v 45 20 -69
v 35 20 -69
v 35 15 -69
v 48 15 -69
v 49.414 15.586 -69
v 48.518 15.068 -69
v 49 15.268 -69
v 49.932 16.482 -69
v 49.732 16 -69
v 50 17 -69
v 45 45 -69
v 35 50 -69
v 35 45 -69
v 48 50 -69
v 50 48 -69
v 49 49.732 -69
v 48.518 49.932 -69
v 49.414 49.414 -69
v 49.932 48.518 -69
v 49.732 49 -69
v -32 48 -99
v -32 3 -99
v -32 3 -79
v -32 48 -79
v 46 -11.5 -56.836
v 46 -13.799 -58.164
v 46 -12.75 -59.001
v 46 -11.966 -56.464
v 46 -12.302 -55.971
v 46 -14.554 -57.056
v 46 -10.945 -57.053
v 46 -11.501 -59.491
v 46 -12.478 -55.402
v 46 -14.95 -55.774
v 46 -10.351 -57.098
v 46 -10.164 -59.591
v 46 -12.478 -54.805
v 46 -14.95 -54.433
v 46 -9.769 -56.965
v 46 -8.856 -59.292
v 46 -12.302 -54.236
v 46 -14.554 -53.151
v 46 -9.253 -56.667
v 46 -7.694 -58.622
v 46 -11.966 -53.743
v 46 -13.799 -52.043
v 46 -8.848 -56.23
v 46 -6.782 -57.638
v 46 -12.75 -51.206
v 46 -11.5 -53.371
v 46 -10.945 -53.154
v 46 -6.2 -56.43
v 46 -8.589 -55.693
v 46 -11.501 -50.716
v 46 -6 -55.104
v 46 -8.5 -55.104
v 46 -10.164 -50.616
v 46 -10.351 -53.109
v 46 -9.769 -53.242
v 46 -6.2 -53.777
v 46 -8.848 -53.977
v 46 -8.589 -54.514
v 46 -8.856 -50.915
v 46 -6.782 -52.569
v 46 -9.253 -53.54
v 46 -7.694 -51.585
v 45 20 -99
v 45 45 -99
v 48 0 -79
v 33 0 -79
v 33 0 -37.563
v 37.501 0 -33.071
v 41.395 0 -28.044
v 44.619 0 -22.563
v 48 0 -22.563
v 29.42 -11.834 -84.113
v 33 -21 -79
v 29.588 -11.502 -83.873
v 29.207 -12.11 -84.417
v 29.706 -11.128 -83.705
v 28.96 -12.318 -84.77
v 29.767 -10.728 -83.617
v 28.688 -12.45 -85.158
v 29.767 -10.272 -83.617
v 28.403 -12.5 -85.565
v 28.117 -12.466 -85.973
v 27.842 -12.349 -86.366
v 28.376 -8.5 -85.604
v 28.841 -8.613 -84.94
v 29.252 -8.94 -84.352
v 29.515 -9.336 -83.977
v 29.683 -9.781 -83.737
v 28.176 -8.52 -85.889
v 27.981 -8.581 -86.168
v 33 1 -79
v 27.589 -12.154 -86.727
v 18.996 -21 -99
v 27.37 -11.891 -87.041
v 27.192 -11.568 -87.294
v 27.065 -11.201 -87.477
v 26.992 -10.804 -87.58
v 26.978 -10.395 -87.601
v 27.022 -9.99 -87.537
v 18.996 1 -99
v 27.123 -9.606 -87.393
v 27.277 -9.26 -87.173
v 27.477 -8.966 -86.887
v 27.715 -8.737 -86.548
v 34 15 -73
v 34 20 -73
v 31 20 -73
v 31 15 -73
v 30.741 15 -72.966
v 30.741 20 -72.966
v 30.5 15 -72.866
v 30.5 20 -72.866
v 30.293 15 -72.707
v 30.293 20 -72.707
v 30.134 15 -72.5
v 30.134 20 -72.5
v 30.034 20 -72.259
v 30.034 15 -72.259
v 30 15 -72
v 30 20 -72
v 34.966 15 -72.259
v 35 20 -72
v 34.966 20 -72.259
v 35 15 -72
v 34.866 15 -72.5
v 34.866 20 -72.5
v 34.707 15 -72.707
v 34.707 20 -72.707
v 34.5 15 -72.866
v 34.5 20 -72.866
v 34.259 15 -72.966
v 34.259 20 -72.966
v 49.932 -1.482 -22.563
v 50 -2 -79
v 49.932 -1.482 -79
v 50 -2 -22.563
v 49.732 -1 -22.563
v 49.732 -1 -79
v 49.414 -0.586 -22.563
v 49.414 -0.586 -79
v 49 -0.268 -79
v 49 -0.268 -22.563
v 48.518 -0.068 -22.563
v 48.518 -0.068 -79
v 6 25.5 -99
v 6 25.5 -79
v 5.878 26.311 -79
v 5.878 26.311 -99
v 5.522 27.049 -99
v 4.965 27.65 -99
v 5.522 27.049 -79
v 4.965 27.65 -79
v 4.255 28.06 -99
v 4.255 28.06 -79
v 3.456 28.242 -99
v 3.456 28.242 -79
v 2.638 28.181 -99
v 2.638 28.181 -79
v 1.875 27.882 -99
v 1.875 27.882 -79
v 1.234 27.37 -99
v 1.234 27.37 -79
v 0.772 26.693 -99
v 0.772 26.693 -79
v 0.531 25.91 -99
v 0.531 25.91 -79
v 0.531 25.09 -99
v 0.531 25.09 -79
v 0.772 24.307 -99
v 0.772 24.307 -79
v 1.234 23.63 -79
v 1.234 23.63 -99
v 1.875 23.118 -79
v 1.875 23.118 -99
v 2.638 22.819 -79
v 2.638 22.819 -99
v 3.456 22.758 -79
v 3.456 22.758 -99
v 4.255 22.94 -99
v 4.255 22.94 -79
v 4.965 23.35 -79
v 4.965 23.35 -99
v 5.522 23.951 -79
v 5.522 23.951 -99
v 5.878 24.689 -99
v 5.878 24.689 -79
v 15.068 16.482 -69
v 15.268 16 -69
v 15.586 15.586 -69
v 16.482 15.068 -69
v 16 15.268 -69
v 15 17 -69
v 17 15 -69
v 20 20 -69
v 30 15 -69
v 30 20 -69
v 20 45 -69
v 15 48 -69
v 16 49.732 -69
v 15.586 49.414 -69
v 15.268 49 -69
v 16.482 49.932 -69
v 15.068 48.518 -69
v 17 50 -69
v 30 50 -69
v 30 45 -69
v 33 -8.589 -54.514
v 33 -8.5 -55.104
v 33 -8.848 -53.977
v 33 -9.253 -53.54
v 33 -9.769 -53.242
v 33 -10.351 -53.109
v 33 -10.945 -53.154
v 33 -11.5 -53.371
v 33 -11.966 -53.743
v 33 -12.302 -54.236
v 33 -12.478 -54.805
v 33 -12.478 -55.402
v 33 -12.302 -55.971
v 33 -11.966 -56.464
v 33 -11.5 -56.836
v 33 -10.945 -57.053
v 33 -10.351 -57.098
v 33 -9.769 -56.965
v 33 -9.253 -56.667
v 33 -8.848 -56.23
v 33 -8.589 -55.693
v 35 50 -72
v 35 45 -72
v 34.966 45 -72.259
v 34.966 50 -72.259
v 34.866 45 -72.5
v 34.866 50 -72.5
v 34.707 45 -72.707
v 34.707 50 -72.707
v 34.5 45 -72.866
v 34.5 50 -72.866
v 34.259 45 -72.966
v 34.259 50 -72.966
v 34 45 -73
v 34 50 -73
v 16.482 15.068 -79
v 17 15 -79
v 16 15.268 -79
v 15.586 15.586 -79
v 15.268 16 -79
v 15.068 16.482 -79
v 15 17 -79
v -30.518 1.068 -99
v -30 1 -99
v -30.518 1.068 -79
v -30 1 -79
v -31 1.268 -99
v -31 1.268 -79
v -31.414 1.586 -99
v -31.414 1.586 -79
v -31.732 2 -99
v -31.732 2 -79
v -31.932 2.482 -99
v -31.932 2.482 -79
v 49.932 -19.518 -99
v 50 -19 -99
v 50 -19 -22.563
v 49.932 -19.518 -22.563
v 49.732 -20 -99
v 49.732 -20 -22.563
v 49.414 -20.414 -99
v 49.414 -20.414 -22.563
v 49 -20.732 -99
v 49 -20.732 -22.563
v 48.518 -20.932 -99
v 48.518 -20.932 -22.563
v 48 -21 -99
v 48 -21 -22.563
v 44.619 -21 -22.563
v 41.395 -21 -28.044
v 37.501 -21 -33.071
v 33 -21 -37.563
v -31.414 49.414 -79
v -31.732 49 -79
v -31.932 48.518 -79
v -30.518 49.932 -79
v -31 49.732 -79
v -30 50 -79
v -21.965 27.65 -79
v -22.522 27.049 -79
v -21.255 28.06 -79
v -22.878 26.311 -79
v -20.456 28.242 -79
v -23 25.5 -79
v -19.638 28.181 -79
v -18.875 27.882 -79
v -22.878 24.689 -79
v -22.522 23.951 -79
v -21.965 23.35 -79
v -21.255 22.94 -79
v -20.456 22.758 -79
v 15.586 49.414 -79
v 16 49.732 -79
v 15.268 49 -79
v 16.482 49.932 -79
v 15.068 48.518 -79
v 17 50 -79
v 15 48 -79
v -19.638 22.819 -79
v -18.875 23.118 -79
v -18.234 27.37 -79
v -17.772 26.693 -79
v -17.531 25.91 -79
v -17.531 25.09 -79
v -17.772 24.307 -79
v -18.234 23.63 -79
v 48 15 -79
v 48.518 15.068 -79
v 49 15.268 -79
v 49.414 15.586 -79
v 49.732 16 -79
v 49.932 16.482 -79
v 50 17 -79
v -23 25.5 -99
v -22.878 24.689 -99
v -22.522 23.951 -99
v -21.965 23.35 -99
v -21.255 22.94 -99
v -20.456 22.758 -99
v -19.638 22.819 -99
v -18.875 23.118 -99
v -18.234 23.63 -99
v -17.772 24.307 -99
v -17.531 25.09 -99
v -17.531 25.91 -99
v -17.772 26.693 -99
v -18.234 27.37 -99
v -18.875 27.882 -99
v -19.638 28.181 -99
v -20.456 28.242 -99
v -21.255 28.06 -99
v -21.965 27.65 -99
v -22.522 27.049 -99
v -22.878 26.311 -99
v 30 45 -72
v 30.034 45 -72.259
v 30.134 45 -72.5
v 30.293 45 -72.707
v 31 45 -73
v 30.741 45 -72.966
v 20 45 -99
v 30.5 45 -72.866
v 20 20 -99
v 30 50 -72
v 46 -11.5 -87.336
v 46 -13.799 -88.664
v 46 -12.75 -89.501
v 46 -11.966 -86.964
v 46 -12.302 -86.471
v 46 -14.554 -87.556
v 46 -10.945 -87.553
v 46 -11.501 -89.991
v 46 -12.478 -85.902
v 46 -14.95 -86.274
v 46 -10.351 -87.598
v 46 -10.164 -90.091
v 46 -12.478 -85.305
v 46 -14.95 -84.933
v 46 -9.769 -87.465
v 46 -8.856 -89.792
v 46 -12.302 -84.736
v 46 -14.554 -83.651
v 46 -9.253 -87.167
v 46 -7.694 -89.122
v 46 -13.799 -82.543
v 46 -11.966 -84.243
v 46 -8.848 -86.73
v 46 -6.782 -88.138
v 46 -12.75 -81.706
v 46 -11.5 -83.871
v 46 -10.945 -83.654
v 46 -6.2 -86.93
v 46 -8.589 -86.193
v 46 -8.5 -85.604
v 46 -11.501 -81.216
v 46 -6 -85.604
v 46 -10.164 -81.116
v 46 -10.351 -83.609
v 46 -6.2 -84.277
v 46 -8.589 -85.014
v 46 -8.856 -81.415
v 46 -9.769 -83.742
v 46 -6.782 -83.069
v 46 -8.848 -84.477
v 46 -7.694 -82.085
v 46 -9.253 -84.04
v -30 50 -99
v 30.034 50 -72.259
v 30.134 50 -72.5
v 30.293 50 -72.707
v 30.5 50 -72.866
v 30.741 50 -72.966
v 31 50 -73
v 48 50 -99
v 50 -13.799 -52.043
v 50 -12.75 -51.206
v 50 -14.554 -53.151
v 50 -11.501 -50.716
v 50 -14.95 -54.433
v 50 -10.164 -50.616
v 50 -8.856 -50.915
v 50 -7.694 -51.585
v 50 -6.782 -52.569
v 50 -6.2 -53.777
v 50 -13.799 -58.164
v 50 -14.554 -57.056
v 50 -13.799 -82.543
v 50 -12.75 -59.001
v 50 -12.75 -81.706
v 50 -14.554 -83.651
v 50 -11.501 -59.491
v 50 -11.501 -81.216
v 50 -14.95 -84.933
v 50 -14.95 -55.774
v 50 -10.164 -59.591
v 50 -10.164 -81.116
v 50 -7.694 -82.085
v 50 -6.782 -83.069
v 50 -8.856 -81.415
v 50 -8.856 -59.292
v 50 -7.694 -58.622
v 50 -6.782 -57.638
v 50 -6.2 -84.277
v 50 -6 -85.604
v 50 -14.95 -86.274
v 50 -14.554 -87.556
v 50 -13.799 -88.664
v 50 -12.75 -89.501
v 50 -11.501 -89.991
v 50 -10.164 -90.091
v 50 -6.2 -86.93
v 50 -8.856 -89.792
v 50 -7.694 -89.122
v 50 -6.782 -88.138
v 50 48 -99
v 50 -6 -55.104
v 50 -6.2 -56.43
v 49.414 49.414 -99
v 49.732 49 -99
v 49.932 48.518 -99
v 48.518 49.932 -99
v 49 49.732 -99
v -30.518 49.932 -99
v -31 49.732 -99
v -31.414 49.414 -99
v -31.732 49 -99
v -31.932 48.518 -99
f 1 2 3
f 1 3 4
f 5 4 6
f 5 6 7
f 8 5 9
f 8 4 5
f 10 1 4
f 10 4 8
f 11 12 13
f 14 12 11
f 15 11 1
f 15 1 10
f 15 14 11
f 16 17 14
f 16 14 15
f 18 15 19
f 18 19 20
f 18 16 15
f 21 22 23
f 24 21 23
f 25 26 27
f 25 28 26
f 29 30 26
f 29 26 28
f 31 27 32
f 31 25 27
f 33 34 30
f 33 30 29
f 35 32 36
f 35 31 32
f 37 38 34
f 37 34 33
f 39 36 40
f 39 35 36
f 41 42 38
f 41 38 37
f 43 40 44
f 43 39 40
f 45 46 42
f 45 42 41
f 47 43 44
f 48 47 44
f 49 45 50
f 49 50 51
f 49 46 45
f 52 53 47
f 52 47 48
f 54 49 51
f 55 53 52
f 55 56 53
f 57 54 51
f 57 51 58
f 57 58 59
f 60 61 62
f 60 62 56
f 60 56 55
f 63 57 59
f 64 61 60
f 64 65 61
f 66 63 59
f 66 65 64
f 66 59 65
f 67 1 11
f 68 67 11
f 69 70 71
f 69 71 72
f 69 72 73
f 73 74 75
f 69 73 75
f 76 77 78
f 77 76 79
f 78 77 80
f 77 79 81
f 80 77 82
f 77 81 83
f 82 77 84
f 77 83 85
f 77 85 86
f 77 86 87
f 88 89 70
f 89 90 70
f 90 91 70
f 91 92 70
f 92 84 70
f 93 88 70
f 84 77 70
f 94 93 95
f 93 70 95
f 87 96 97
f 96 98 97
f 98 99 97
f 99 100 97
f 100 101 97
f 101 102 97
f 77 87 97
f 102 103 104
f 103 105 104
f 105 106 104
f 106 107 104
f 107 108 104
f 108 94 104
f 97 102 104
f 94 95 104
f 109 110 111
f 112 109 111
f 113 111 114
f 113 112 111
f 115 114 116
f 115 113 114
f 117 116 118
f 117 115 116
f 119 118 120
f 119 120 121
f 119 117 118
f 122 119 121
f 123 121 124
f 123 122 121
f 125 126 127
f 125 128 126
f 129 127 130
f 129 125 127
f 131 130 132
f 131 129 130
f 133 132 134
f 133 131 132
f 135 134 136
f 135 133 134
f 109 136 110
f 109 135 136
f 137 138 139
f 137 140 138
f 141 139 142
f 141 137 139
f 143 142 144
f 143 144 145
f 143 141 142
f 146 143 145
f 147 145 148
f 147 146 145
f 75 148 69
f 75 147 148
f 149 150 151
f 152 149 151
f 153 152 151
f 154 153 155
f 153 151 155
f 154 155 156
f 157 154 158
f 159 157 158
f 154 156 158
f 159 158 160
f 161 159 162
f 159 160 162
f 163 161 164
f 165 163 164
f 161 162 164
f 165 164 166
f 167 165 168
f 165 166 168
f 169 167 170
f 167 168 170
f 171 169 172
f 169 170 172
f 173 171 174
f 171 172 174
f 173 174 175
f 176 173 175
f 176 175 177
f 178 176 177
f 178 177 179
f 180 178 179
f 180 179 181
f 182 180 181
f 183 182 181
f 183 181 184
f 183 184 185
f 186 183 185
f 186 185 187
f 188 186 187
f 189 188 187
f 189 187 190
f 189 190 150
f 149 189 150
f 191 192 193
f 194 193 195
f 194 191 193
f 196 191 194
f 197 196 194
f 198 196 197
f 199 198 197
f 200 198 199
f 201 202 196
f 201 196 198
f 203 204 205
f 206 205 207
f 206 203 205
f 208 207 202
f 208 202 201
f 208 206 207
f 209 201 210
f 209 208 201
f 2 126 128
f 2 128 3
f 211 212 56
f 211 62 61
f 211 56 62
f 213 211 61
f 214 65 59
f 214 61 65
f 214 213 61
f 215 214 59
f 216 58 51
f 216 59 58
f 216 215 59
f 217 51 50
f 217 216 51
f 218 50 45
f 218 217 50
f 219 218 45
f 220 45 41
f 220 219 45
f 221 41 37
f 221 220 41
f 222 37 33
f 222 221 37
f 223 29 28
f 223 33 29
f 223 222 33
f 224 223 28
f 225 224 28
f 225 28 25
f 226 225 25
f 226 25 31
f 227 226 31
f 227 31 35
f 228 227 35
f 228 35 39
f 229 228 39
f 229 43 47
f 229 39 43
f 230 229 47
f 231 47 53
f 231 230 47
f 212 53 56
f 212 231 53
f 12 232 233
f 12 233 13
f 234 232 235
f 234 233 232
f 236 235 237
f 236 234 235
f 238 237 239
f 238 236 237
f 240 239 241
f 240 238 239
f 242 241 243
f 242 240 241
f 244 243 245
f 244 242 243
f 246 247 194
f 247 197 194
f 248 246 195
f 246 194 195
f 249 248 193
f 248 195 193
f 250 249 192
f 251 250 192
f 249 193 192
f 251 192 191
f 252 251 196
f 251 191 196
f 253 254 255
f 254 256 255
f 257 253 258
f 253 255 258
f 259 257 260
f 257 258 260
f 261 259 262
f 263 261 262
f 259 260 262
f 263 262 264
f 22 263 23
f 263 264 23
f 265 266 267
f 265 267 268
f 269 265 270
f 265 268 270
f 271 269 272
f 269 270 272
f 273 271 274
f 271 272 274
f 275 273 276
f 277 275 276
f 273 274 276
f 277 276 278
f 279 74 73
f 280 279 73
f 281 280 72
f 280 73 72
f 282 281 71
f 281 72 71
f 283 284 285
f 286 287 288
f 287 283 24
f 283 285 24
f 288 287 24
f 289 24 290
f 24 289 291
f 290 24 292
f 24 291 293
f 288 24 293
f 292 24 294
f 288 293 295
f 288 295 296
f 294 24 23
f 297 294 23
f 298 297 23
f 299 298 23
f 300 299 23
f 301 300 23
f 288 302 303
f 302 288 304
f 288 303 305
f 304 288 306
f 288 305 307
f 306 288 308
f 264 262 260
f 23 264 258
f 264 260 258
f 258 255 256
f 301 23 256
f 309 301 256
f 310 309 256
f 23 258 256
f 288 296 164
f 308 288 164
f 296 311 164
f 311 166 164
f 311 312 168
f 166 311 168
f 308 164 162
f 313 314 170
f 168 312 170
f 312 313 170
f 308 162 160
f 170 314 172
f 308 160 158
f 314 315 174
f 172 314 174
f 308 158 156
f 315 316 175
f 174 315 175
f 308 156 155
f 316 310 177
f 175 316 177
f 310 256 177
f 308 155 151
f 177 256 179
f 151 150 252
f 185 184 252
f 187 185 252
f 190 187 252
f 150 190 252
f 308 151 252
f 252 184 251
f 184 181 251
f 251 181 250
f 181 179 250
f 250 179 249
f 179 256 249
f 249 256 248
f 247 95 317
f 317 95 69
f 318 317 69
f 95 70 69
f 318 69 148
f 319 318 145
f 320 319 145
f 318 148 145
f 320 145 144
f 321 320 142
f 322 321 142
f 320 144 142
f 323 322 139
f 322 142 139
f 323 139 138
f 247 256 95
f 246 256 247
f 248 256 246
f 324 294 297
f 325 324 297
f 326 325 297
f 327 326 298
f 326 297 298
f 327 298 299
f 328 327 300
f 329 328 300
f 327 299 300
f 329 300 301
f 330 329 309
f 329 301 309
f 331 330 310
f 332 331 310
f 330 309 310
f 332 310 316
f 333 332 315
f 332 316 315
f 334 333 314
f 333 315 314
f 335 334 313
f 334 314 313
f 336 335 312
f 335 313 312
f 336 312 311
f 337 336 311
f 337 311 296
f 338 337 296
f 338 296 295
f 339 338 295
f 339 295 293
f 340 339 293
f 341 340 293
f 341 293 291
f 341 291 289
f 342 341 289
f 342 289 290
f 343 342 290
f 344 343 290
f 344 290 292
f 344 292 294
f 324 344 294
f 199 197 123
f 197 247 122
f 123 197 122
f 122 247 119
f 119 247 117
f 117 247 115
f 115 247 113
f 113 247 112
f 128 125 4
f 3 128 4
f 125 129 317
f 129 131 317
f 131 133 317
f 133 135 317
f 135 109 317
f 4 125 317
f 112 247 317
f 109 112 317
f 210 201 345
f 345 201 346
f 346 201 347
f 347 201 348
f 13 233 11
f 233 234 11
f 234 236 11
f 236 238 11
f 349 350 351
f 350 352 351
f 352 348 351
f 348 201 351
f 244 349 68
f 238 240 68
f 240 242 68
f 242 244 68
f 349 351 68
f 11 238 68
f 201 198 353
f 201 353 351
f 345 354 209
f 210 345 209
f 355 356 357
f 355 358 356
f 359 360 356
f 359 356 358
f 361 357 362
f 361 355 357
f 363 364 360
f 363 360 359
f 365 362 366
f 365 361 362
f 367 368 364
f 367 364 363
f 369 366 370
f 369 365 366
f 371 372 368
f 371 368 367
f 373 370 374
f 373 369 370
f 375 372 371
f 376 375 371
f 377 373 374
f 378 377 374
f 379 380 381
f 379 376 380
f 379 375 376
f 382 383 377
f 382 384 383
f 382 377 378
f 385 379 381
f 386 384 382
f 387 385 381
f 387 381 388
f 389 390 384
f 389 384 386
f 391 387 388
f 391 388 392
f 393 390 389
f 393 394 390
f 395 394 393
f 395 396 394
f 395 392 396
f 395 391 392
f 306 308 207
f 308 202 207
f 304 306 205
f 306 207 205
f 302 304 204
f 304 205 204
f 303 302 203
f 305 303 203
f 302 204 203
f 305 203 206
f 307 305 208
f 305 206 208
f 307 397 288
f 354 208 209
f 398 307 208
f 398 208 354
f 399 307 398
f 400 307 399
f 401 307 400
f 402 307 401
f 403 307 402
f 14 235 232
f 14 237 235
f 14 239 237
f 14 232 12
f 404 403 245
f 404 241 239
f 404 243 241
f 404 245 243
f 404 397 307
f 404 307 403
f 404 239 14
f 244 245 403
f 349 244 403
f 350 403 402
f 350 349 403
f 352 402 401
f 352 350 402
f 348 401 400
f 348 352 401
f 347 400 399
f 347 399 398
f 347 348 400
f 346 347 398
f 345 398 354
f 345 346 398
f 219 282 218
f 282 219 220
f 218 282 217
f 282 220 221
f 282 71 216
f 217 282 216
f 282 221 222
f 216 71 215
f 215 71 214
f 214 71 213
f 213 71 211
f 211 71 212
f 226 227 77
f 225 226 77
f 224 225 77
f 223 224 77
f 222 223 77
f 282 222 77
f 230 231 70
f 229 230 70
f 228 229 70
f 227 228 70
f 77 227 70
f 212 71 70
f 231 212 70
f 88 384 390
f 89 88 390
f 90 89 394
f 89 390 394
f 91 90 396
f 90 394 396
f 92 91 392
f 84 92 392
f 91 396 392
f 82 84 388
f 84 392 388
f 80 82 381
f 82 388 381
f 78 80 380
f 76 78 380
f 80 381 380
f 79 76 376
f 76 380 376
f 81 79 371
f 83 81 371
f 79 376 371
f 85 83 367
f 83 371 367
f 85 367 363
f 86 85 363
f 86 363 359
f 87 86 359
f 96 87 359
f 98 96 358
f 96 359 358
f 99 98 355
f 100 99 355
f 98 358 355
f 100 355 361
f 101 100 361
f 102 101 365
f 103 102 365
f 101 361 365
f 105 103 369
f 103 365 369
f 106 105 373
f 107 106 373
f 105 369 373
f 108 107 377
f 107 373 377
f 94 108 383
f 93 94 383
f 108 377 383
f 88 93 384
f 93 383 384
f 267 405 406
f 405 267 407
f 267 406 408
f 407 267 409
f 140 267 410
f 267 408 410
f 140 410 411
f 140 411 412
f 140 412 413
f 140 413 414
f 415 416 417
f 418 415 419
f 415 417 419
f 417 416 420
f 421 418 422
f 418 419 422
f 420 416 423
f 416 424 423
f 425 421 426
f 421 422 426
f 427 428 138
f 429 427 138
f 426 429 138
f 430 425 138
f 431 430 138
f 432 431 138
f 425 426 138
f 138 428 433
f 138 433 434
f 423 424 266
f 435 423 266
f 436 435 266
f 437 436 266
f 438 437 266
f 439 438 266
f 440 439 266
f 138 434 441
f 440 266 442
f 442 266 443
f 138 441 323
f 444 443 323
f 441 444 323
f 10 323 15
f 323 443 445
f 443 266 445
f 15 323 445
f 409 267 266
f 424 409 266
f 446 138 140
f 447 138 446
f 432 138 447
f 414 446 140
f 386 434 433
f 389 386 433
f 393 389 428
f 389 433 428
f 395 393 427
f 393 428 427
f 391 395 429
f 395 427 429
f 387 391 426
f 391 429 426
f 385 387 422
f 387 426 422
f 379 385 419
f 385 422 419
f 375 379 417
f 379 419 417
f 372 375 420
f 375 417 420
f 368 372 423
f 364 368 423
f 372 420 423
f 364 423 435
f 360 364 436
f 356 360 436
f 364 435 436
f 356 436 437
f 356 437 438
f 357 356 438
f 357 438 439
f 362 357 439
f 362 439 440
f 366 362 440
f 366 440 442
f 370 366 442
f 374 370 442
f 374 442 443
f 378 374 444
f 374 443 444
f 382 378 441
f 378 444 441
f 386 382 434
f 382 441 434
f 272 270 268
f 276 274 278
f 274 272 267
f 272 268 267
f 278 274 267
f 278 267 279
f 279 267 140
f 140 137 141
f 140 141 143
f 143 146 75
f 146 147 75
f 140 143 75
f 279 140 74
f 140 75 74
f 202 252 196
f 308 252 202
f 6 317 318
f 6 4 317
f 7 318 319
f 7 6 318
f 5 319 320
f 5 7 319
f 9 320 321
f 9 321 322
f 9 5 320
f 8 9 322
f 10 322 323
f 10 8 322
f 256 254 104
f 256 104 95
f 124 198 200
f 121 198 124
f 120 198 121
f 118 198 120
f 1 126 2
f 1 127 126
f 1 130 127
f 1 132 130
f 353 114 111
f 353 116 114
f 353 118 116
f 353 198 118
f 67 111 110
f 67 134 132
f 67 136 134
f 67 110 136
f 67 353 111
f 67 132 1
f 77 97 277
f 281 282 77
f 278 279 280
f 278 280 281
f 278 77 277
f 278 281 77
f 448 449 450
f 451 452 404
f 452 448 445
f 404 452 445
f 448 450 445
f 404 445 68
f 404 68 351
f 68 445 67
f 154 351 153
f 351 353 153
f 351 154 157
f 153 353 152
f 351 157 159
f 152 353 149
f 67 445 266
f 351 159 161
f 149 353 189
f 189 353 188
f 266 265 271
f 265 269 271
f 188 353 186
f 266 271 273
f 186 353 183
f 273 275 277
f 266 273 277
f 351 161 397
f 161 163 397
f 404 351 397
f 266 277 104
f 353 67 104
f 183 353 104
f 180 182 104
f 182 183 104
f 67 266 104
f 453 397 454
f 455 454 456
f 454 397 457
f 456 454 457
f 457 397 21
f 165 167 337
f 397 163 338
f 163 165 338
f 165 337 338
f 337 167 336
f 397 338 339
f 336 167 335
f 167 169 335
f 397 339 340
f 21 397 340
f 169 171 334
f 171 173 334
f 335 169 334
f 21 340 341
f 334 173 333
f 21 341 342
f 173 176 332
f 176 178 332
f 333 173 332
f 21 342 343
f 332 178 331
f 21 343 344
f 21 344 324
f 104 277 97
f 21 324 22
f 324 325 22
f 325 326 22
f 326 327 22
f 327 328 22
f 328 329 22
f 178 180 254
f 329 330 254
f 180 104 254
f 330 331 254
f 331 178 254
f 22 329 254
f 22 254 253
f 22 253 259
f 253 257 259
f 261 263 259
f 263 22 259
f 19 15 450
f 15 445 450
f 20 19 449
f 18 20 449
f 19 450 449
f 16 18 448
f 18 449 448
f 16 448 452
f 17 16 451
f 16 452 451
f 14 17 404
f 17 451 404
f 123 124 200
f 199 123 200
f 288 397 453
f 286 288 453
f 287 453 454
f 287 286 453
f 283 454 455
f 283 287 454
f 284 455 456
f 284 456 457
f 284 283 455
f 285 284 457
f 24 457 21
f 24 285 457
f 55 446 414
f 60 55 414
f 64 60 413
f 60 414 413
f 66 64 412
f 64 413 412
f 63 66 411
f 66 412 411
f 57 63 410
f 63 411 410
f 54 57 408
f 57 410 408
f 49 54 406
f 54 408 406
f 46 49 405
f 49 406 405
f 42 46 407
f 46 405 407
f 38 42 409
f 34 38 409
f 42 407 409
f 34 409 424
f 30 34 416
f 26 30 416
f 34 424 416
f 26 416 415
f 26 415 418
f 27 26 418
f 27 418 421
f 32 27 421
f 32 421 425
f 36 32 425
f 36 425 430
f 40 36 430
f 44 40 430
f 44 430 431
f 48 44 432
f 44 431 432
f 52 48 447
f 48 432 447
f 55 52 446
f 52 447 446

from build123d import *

# Parameters (mm, degrees)
F1_DEPTH  = 21
F2_R      = 2
F3_DEPTH  = 50
F4_R      = 4.5
F5_DEPTH  = 4
F6_R      = 4.5
F7_DEPTH  = 4
F8_R      = 2
F9_DEPTH  = 15
F11_DEPTH = 12
F12_W     = 82.7163627307
F12_H     = 105.0548920631
F12_W_2   = 93.7405878742
F12_H_2   = 84.4749022052
F13_DEPTH = 25
F15_DEPTH = 50
F16_W     = 1
F16_H     = 20
F17_DEPTH = 65
F18_DEPTH = 25
F19_W     = 35
F19_H     = 35
F19_W_2   = 25
F19_H_2   = 25
F20_DEPTH = 10
F21_DEPTH = 25
F22_W     = 5
F22_H     = 8
F23_DEPTH = 41
F24_R     = 1
F25_R     = 2.75
F26_DEPTH = 25
F27_R     = 2


with BuildPart() as f1:
    # F0 (on Front) → F1 (new body)
    with BuildSketch(Plane.XZ):
        with BuildLine():
            ThreePointArc((44.6194845136, -22.563279942), (39.5277888838, -30.6195020528), (33, -37.563279942))
            Line((33, -37.563279942), (33, -79))
            Line((33, -79), (18.9958492358, -99))
            Line((18.9958492358, -99), (0, -99))
            Line((0, -99), (-33, -99))
            Line((-33, -99), (-33, -37.563279942))
            ThreePointArc((-33, -37.563279942), (-39.5277888838, -30.6195020528), (-44.6194845136, -22.563279942))
            Line((-44.6194845136, -22.563279942), (-50, -22.563279942))
            Line((-50, -22.563279942), (-50, -133))
            Line((-50, -133), (-33, -150))
            Line((-33, -150), (-33, -180))
            Line((-33, -180), (-33, -197))
            Line((-33, -197), (0, -197))
            Line((0, -197), (33, -197))
            Line((33, -197), (33, -180))
            Line((33, -180), (33, -150))
            Line((33, -150), (50, -133))
            Line((50, -133), (50, -22.563279942))
            Line((50, -22.563279942), (44.6194845136, -22.563279942))
        make_face()
    extrude(amount=F1_DEPTH)

    # F2 (on Right) → F3 (cut, symmetric)
    with BuildSketch(Plane.YZ):
        with Locations((-10.5, -55.10355)):
            Circle(F2_R)
        with Locations((-10.5, -85.60355)):
            Circle(F2_R)
    extrude(amount=F3_DEPTH, both=True, mode=Mode.SUBTRACT)

    # F4 (on face) → F5 (cut)
    with BuildSketch(Plane(origin=(-50, 0, 0), x_dir=(0, -1, 0), z_dir=(-1, 0, 0))):
        with Locations((10.5, -55.10355)):
            Circle(F4_R)
        with Locations((10.5, -85.60355)):
            Circle(F4_R)
    extrude(amount=-F5_DEPTH, mode=Mode.SUBTRACT)

    # F6 (on face) → F7 (cut)
    with BuildSketch(Plane.YZ.offset(50)):
        with Locations((-10.5, -55.10355)):
            Circle(F6_R)
        with Locations((-10.5, -85.60355)):
            Circle(F6_R)
    extrude(amount=-F7_DEPTH, mode=Mode.SUBTRACT)

    # F8 (on face) → F9 (cut)
    with BuildSketch(Plane(origin=(0, 0, -197), x_dir=(1, 0, 0), z_dir=(0, 0, -1))):
        with BuildLine():
            ThreePointArc((-23, 10.5), (-21, 8.5), (-19, 10.5))
            ThreePointArc((-19, 10.5), (-21, 12.5), (-23, 10.5))
        make_face()
        with Locations((21, 10.5)):
            Circle(F8_R)
    extrude(amount=-F9_DEPTH, mode=Mode.SUBTRACT)

    # F10 (on face) → F11 (cut)
    with BuildSketch(Plane.XZ.offset(21)):
        with BuildLine():
            ThreePointArc((0, -166.5), (-2, -168.5), (0, -170.5))
            Line((0, -170.5), (0, -166.5))
        make_face()
        with BuildLine():
            ThreePointArc((0, -131), (-2, -133), (0, -135))
            Line((0, -135), (0, -131))
        make_face()
        with BuildLine():
            Line((0, -131), (0, -135))
            ThreePointArc((0, -135), (1.4142135624, -134.4142135624), (2, -133))
            ThreePointArc((2, -133), (1.4142135624, -131.5857864376), (0, -131))
        make_face()
        with BuildLine():
            Line((0, -166.5), (0, -170.5))
            ThreePointArc((0, -170.5), (1.4142135624, -169.9142135624), (2, -168.5))
            ThreePointArc((2, -168.5), (1.4142135624, -167.0857864376), (0, -166.5))
        make_face()
    extrude(amount=-F11_DEPTH, mode=Mode.SUBTRACT)

    # F12 (on face) → F13 (cut)
    with BuildSketch(Plane.XZ.offset(21)):
        with Locations((60.3540306012, -151.5274460316)):
            Rectangle(F12_W, F12_H)
        with Locations((-27.8744447013, -151.5274460316)):
            Rectangle(F12_W_2, F12_H)
        with Locations((-27.8744447013, -56.7625488974)):
            Rectangle(F12_W_2, F12_H_2)
    extrude(amount=-F13_DEPTH, mode=Mode.SUBTRACT)

    # F14 (on face) → F15 (join)
    with BuildSketch(Plane(origin=(0, 0, 0), x_dir=(-1, 0, 0), z_dir=(0, 1, 0))):
        Polygon((-50, -79), (-50, -99), (24.0241140127, -99), (32, -99), (32, -79), (24.0241140127, -79), (-33, -79), align=None)
    extrude(amount=F15_DEPTH)

    # F16 (on face) → F17 (cut)
    with BuildSketch(Plane(origin=(-32, 0, 0), x_dir=(0, -1, 0), z_dir=(-1, 0, 0))):
        with Locations((-0.5, -89)):
            Rectangle(F16_W, F16_H)
    extrude(amount=-F17_DEPTH, mode=Mode.SUBTRACT)

    # F18 (add): a face of the model
    f18_faces = [f1.faces().sort_by_distance(p)[0] for p in [
        (28.3319497453, 0, -92.3333333333),
    ]]
    extrude(f18_faces, amount=F18_DEPTH)

    # F19 (on face) → F20 (join)
    with BuildSketch(Plane.XY.offset(-79)):
        with Locations((32.5, 32.5)):
            Rectangle(F19_W, F19_H)
        with Locations((32.5, 32.5)):
            Rectangle(F19_W_2, F19_H_2, mode=Mode.SUBTRACT)
    extrude(amount=F20_DEPTH)

    # F21 (cut): a face of the model
    f21_faces = [f1.faces().sort_by_distance(p)[0] for p in [
        (32.5, 32.5, -79),
    ]]
    extrude(f21_faces, amount=-F21_DEPTH, mode=Mode.SUBTRACT)

    # F22 (on face) → F23 (cut)
    with BuildSketch(Plane(origin=(0, 50, 0), x_dir=(-1, 0, 0), z_dir=(0, 1, 0))):
        with Locations((-32.5, -69)):
            Rectangle(F22_W, F22_H)
    extrude(amount=-F23_DEPTH, mode=Mode.SUBTRACT)

    # F24
    f24_edges = [f1.edges().sort_by_distance(p)[0] for p in [
        (35, 17.5, -73),
        (30, 17.5, -73),
        (35, 47.5, -73),
        (30, 47.5, -73),
    ]]
    fillet(f24_edges, radius=F24_R)

    # F25 (on face) → F26 (cut)
    with BuildSketch(Plane.XY.offset(-79)):
        with BuildLine():
            ThreePointArc((-17.5, 25.5), (-20.25, 28.25), (-23, 25.5))
            Line((-23, 25.5), (-17.5, 25.5))
        make_face()
        with BuildLine():
            Line((-17.5, 25.5), (-23, 25.5))
            ThreePointArc((-23, 25.5), (-20.25, 22.75), (-17.5, 25.5))
        make_face()
        with Locations((3.25, 25.5)):
            Circle(F25_R)
    extrude(amount=-F26_DEPTH, mode=Mode.SUBTRACT)

    # F27
    f27_edges = [f1.edges().sort_by_distance(p)[0] for p in [
        (50, -21, -60.78164),
        (50, 0, -50.78164),
        (50, 50, -84),
        (50, 15, -74),
        (15, 50, -74),
        (15, 15, -74),
        (-32, 50, -89),
        (-32, 1, -89),
    ]]
    fillet(f27_edges, radius=F27_R)


solid = f1.part
